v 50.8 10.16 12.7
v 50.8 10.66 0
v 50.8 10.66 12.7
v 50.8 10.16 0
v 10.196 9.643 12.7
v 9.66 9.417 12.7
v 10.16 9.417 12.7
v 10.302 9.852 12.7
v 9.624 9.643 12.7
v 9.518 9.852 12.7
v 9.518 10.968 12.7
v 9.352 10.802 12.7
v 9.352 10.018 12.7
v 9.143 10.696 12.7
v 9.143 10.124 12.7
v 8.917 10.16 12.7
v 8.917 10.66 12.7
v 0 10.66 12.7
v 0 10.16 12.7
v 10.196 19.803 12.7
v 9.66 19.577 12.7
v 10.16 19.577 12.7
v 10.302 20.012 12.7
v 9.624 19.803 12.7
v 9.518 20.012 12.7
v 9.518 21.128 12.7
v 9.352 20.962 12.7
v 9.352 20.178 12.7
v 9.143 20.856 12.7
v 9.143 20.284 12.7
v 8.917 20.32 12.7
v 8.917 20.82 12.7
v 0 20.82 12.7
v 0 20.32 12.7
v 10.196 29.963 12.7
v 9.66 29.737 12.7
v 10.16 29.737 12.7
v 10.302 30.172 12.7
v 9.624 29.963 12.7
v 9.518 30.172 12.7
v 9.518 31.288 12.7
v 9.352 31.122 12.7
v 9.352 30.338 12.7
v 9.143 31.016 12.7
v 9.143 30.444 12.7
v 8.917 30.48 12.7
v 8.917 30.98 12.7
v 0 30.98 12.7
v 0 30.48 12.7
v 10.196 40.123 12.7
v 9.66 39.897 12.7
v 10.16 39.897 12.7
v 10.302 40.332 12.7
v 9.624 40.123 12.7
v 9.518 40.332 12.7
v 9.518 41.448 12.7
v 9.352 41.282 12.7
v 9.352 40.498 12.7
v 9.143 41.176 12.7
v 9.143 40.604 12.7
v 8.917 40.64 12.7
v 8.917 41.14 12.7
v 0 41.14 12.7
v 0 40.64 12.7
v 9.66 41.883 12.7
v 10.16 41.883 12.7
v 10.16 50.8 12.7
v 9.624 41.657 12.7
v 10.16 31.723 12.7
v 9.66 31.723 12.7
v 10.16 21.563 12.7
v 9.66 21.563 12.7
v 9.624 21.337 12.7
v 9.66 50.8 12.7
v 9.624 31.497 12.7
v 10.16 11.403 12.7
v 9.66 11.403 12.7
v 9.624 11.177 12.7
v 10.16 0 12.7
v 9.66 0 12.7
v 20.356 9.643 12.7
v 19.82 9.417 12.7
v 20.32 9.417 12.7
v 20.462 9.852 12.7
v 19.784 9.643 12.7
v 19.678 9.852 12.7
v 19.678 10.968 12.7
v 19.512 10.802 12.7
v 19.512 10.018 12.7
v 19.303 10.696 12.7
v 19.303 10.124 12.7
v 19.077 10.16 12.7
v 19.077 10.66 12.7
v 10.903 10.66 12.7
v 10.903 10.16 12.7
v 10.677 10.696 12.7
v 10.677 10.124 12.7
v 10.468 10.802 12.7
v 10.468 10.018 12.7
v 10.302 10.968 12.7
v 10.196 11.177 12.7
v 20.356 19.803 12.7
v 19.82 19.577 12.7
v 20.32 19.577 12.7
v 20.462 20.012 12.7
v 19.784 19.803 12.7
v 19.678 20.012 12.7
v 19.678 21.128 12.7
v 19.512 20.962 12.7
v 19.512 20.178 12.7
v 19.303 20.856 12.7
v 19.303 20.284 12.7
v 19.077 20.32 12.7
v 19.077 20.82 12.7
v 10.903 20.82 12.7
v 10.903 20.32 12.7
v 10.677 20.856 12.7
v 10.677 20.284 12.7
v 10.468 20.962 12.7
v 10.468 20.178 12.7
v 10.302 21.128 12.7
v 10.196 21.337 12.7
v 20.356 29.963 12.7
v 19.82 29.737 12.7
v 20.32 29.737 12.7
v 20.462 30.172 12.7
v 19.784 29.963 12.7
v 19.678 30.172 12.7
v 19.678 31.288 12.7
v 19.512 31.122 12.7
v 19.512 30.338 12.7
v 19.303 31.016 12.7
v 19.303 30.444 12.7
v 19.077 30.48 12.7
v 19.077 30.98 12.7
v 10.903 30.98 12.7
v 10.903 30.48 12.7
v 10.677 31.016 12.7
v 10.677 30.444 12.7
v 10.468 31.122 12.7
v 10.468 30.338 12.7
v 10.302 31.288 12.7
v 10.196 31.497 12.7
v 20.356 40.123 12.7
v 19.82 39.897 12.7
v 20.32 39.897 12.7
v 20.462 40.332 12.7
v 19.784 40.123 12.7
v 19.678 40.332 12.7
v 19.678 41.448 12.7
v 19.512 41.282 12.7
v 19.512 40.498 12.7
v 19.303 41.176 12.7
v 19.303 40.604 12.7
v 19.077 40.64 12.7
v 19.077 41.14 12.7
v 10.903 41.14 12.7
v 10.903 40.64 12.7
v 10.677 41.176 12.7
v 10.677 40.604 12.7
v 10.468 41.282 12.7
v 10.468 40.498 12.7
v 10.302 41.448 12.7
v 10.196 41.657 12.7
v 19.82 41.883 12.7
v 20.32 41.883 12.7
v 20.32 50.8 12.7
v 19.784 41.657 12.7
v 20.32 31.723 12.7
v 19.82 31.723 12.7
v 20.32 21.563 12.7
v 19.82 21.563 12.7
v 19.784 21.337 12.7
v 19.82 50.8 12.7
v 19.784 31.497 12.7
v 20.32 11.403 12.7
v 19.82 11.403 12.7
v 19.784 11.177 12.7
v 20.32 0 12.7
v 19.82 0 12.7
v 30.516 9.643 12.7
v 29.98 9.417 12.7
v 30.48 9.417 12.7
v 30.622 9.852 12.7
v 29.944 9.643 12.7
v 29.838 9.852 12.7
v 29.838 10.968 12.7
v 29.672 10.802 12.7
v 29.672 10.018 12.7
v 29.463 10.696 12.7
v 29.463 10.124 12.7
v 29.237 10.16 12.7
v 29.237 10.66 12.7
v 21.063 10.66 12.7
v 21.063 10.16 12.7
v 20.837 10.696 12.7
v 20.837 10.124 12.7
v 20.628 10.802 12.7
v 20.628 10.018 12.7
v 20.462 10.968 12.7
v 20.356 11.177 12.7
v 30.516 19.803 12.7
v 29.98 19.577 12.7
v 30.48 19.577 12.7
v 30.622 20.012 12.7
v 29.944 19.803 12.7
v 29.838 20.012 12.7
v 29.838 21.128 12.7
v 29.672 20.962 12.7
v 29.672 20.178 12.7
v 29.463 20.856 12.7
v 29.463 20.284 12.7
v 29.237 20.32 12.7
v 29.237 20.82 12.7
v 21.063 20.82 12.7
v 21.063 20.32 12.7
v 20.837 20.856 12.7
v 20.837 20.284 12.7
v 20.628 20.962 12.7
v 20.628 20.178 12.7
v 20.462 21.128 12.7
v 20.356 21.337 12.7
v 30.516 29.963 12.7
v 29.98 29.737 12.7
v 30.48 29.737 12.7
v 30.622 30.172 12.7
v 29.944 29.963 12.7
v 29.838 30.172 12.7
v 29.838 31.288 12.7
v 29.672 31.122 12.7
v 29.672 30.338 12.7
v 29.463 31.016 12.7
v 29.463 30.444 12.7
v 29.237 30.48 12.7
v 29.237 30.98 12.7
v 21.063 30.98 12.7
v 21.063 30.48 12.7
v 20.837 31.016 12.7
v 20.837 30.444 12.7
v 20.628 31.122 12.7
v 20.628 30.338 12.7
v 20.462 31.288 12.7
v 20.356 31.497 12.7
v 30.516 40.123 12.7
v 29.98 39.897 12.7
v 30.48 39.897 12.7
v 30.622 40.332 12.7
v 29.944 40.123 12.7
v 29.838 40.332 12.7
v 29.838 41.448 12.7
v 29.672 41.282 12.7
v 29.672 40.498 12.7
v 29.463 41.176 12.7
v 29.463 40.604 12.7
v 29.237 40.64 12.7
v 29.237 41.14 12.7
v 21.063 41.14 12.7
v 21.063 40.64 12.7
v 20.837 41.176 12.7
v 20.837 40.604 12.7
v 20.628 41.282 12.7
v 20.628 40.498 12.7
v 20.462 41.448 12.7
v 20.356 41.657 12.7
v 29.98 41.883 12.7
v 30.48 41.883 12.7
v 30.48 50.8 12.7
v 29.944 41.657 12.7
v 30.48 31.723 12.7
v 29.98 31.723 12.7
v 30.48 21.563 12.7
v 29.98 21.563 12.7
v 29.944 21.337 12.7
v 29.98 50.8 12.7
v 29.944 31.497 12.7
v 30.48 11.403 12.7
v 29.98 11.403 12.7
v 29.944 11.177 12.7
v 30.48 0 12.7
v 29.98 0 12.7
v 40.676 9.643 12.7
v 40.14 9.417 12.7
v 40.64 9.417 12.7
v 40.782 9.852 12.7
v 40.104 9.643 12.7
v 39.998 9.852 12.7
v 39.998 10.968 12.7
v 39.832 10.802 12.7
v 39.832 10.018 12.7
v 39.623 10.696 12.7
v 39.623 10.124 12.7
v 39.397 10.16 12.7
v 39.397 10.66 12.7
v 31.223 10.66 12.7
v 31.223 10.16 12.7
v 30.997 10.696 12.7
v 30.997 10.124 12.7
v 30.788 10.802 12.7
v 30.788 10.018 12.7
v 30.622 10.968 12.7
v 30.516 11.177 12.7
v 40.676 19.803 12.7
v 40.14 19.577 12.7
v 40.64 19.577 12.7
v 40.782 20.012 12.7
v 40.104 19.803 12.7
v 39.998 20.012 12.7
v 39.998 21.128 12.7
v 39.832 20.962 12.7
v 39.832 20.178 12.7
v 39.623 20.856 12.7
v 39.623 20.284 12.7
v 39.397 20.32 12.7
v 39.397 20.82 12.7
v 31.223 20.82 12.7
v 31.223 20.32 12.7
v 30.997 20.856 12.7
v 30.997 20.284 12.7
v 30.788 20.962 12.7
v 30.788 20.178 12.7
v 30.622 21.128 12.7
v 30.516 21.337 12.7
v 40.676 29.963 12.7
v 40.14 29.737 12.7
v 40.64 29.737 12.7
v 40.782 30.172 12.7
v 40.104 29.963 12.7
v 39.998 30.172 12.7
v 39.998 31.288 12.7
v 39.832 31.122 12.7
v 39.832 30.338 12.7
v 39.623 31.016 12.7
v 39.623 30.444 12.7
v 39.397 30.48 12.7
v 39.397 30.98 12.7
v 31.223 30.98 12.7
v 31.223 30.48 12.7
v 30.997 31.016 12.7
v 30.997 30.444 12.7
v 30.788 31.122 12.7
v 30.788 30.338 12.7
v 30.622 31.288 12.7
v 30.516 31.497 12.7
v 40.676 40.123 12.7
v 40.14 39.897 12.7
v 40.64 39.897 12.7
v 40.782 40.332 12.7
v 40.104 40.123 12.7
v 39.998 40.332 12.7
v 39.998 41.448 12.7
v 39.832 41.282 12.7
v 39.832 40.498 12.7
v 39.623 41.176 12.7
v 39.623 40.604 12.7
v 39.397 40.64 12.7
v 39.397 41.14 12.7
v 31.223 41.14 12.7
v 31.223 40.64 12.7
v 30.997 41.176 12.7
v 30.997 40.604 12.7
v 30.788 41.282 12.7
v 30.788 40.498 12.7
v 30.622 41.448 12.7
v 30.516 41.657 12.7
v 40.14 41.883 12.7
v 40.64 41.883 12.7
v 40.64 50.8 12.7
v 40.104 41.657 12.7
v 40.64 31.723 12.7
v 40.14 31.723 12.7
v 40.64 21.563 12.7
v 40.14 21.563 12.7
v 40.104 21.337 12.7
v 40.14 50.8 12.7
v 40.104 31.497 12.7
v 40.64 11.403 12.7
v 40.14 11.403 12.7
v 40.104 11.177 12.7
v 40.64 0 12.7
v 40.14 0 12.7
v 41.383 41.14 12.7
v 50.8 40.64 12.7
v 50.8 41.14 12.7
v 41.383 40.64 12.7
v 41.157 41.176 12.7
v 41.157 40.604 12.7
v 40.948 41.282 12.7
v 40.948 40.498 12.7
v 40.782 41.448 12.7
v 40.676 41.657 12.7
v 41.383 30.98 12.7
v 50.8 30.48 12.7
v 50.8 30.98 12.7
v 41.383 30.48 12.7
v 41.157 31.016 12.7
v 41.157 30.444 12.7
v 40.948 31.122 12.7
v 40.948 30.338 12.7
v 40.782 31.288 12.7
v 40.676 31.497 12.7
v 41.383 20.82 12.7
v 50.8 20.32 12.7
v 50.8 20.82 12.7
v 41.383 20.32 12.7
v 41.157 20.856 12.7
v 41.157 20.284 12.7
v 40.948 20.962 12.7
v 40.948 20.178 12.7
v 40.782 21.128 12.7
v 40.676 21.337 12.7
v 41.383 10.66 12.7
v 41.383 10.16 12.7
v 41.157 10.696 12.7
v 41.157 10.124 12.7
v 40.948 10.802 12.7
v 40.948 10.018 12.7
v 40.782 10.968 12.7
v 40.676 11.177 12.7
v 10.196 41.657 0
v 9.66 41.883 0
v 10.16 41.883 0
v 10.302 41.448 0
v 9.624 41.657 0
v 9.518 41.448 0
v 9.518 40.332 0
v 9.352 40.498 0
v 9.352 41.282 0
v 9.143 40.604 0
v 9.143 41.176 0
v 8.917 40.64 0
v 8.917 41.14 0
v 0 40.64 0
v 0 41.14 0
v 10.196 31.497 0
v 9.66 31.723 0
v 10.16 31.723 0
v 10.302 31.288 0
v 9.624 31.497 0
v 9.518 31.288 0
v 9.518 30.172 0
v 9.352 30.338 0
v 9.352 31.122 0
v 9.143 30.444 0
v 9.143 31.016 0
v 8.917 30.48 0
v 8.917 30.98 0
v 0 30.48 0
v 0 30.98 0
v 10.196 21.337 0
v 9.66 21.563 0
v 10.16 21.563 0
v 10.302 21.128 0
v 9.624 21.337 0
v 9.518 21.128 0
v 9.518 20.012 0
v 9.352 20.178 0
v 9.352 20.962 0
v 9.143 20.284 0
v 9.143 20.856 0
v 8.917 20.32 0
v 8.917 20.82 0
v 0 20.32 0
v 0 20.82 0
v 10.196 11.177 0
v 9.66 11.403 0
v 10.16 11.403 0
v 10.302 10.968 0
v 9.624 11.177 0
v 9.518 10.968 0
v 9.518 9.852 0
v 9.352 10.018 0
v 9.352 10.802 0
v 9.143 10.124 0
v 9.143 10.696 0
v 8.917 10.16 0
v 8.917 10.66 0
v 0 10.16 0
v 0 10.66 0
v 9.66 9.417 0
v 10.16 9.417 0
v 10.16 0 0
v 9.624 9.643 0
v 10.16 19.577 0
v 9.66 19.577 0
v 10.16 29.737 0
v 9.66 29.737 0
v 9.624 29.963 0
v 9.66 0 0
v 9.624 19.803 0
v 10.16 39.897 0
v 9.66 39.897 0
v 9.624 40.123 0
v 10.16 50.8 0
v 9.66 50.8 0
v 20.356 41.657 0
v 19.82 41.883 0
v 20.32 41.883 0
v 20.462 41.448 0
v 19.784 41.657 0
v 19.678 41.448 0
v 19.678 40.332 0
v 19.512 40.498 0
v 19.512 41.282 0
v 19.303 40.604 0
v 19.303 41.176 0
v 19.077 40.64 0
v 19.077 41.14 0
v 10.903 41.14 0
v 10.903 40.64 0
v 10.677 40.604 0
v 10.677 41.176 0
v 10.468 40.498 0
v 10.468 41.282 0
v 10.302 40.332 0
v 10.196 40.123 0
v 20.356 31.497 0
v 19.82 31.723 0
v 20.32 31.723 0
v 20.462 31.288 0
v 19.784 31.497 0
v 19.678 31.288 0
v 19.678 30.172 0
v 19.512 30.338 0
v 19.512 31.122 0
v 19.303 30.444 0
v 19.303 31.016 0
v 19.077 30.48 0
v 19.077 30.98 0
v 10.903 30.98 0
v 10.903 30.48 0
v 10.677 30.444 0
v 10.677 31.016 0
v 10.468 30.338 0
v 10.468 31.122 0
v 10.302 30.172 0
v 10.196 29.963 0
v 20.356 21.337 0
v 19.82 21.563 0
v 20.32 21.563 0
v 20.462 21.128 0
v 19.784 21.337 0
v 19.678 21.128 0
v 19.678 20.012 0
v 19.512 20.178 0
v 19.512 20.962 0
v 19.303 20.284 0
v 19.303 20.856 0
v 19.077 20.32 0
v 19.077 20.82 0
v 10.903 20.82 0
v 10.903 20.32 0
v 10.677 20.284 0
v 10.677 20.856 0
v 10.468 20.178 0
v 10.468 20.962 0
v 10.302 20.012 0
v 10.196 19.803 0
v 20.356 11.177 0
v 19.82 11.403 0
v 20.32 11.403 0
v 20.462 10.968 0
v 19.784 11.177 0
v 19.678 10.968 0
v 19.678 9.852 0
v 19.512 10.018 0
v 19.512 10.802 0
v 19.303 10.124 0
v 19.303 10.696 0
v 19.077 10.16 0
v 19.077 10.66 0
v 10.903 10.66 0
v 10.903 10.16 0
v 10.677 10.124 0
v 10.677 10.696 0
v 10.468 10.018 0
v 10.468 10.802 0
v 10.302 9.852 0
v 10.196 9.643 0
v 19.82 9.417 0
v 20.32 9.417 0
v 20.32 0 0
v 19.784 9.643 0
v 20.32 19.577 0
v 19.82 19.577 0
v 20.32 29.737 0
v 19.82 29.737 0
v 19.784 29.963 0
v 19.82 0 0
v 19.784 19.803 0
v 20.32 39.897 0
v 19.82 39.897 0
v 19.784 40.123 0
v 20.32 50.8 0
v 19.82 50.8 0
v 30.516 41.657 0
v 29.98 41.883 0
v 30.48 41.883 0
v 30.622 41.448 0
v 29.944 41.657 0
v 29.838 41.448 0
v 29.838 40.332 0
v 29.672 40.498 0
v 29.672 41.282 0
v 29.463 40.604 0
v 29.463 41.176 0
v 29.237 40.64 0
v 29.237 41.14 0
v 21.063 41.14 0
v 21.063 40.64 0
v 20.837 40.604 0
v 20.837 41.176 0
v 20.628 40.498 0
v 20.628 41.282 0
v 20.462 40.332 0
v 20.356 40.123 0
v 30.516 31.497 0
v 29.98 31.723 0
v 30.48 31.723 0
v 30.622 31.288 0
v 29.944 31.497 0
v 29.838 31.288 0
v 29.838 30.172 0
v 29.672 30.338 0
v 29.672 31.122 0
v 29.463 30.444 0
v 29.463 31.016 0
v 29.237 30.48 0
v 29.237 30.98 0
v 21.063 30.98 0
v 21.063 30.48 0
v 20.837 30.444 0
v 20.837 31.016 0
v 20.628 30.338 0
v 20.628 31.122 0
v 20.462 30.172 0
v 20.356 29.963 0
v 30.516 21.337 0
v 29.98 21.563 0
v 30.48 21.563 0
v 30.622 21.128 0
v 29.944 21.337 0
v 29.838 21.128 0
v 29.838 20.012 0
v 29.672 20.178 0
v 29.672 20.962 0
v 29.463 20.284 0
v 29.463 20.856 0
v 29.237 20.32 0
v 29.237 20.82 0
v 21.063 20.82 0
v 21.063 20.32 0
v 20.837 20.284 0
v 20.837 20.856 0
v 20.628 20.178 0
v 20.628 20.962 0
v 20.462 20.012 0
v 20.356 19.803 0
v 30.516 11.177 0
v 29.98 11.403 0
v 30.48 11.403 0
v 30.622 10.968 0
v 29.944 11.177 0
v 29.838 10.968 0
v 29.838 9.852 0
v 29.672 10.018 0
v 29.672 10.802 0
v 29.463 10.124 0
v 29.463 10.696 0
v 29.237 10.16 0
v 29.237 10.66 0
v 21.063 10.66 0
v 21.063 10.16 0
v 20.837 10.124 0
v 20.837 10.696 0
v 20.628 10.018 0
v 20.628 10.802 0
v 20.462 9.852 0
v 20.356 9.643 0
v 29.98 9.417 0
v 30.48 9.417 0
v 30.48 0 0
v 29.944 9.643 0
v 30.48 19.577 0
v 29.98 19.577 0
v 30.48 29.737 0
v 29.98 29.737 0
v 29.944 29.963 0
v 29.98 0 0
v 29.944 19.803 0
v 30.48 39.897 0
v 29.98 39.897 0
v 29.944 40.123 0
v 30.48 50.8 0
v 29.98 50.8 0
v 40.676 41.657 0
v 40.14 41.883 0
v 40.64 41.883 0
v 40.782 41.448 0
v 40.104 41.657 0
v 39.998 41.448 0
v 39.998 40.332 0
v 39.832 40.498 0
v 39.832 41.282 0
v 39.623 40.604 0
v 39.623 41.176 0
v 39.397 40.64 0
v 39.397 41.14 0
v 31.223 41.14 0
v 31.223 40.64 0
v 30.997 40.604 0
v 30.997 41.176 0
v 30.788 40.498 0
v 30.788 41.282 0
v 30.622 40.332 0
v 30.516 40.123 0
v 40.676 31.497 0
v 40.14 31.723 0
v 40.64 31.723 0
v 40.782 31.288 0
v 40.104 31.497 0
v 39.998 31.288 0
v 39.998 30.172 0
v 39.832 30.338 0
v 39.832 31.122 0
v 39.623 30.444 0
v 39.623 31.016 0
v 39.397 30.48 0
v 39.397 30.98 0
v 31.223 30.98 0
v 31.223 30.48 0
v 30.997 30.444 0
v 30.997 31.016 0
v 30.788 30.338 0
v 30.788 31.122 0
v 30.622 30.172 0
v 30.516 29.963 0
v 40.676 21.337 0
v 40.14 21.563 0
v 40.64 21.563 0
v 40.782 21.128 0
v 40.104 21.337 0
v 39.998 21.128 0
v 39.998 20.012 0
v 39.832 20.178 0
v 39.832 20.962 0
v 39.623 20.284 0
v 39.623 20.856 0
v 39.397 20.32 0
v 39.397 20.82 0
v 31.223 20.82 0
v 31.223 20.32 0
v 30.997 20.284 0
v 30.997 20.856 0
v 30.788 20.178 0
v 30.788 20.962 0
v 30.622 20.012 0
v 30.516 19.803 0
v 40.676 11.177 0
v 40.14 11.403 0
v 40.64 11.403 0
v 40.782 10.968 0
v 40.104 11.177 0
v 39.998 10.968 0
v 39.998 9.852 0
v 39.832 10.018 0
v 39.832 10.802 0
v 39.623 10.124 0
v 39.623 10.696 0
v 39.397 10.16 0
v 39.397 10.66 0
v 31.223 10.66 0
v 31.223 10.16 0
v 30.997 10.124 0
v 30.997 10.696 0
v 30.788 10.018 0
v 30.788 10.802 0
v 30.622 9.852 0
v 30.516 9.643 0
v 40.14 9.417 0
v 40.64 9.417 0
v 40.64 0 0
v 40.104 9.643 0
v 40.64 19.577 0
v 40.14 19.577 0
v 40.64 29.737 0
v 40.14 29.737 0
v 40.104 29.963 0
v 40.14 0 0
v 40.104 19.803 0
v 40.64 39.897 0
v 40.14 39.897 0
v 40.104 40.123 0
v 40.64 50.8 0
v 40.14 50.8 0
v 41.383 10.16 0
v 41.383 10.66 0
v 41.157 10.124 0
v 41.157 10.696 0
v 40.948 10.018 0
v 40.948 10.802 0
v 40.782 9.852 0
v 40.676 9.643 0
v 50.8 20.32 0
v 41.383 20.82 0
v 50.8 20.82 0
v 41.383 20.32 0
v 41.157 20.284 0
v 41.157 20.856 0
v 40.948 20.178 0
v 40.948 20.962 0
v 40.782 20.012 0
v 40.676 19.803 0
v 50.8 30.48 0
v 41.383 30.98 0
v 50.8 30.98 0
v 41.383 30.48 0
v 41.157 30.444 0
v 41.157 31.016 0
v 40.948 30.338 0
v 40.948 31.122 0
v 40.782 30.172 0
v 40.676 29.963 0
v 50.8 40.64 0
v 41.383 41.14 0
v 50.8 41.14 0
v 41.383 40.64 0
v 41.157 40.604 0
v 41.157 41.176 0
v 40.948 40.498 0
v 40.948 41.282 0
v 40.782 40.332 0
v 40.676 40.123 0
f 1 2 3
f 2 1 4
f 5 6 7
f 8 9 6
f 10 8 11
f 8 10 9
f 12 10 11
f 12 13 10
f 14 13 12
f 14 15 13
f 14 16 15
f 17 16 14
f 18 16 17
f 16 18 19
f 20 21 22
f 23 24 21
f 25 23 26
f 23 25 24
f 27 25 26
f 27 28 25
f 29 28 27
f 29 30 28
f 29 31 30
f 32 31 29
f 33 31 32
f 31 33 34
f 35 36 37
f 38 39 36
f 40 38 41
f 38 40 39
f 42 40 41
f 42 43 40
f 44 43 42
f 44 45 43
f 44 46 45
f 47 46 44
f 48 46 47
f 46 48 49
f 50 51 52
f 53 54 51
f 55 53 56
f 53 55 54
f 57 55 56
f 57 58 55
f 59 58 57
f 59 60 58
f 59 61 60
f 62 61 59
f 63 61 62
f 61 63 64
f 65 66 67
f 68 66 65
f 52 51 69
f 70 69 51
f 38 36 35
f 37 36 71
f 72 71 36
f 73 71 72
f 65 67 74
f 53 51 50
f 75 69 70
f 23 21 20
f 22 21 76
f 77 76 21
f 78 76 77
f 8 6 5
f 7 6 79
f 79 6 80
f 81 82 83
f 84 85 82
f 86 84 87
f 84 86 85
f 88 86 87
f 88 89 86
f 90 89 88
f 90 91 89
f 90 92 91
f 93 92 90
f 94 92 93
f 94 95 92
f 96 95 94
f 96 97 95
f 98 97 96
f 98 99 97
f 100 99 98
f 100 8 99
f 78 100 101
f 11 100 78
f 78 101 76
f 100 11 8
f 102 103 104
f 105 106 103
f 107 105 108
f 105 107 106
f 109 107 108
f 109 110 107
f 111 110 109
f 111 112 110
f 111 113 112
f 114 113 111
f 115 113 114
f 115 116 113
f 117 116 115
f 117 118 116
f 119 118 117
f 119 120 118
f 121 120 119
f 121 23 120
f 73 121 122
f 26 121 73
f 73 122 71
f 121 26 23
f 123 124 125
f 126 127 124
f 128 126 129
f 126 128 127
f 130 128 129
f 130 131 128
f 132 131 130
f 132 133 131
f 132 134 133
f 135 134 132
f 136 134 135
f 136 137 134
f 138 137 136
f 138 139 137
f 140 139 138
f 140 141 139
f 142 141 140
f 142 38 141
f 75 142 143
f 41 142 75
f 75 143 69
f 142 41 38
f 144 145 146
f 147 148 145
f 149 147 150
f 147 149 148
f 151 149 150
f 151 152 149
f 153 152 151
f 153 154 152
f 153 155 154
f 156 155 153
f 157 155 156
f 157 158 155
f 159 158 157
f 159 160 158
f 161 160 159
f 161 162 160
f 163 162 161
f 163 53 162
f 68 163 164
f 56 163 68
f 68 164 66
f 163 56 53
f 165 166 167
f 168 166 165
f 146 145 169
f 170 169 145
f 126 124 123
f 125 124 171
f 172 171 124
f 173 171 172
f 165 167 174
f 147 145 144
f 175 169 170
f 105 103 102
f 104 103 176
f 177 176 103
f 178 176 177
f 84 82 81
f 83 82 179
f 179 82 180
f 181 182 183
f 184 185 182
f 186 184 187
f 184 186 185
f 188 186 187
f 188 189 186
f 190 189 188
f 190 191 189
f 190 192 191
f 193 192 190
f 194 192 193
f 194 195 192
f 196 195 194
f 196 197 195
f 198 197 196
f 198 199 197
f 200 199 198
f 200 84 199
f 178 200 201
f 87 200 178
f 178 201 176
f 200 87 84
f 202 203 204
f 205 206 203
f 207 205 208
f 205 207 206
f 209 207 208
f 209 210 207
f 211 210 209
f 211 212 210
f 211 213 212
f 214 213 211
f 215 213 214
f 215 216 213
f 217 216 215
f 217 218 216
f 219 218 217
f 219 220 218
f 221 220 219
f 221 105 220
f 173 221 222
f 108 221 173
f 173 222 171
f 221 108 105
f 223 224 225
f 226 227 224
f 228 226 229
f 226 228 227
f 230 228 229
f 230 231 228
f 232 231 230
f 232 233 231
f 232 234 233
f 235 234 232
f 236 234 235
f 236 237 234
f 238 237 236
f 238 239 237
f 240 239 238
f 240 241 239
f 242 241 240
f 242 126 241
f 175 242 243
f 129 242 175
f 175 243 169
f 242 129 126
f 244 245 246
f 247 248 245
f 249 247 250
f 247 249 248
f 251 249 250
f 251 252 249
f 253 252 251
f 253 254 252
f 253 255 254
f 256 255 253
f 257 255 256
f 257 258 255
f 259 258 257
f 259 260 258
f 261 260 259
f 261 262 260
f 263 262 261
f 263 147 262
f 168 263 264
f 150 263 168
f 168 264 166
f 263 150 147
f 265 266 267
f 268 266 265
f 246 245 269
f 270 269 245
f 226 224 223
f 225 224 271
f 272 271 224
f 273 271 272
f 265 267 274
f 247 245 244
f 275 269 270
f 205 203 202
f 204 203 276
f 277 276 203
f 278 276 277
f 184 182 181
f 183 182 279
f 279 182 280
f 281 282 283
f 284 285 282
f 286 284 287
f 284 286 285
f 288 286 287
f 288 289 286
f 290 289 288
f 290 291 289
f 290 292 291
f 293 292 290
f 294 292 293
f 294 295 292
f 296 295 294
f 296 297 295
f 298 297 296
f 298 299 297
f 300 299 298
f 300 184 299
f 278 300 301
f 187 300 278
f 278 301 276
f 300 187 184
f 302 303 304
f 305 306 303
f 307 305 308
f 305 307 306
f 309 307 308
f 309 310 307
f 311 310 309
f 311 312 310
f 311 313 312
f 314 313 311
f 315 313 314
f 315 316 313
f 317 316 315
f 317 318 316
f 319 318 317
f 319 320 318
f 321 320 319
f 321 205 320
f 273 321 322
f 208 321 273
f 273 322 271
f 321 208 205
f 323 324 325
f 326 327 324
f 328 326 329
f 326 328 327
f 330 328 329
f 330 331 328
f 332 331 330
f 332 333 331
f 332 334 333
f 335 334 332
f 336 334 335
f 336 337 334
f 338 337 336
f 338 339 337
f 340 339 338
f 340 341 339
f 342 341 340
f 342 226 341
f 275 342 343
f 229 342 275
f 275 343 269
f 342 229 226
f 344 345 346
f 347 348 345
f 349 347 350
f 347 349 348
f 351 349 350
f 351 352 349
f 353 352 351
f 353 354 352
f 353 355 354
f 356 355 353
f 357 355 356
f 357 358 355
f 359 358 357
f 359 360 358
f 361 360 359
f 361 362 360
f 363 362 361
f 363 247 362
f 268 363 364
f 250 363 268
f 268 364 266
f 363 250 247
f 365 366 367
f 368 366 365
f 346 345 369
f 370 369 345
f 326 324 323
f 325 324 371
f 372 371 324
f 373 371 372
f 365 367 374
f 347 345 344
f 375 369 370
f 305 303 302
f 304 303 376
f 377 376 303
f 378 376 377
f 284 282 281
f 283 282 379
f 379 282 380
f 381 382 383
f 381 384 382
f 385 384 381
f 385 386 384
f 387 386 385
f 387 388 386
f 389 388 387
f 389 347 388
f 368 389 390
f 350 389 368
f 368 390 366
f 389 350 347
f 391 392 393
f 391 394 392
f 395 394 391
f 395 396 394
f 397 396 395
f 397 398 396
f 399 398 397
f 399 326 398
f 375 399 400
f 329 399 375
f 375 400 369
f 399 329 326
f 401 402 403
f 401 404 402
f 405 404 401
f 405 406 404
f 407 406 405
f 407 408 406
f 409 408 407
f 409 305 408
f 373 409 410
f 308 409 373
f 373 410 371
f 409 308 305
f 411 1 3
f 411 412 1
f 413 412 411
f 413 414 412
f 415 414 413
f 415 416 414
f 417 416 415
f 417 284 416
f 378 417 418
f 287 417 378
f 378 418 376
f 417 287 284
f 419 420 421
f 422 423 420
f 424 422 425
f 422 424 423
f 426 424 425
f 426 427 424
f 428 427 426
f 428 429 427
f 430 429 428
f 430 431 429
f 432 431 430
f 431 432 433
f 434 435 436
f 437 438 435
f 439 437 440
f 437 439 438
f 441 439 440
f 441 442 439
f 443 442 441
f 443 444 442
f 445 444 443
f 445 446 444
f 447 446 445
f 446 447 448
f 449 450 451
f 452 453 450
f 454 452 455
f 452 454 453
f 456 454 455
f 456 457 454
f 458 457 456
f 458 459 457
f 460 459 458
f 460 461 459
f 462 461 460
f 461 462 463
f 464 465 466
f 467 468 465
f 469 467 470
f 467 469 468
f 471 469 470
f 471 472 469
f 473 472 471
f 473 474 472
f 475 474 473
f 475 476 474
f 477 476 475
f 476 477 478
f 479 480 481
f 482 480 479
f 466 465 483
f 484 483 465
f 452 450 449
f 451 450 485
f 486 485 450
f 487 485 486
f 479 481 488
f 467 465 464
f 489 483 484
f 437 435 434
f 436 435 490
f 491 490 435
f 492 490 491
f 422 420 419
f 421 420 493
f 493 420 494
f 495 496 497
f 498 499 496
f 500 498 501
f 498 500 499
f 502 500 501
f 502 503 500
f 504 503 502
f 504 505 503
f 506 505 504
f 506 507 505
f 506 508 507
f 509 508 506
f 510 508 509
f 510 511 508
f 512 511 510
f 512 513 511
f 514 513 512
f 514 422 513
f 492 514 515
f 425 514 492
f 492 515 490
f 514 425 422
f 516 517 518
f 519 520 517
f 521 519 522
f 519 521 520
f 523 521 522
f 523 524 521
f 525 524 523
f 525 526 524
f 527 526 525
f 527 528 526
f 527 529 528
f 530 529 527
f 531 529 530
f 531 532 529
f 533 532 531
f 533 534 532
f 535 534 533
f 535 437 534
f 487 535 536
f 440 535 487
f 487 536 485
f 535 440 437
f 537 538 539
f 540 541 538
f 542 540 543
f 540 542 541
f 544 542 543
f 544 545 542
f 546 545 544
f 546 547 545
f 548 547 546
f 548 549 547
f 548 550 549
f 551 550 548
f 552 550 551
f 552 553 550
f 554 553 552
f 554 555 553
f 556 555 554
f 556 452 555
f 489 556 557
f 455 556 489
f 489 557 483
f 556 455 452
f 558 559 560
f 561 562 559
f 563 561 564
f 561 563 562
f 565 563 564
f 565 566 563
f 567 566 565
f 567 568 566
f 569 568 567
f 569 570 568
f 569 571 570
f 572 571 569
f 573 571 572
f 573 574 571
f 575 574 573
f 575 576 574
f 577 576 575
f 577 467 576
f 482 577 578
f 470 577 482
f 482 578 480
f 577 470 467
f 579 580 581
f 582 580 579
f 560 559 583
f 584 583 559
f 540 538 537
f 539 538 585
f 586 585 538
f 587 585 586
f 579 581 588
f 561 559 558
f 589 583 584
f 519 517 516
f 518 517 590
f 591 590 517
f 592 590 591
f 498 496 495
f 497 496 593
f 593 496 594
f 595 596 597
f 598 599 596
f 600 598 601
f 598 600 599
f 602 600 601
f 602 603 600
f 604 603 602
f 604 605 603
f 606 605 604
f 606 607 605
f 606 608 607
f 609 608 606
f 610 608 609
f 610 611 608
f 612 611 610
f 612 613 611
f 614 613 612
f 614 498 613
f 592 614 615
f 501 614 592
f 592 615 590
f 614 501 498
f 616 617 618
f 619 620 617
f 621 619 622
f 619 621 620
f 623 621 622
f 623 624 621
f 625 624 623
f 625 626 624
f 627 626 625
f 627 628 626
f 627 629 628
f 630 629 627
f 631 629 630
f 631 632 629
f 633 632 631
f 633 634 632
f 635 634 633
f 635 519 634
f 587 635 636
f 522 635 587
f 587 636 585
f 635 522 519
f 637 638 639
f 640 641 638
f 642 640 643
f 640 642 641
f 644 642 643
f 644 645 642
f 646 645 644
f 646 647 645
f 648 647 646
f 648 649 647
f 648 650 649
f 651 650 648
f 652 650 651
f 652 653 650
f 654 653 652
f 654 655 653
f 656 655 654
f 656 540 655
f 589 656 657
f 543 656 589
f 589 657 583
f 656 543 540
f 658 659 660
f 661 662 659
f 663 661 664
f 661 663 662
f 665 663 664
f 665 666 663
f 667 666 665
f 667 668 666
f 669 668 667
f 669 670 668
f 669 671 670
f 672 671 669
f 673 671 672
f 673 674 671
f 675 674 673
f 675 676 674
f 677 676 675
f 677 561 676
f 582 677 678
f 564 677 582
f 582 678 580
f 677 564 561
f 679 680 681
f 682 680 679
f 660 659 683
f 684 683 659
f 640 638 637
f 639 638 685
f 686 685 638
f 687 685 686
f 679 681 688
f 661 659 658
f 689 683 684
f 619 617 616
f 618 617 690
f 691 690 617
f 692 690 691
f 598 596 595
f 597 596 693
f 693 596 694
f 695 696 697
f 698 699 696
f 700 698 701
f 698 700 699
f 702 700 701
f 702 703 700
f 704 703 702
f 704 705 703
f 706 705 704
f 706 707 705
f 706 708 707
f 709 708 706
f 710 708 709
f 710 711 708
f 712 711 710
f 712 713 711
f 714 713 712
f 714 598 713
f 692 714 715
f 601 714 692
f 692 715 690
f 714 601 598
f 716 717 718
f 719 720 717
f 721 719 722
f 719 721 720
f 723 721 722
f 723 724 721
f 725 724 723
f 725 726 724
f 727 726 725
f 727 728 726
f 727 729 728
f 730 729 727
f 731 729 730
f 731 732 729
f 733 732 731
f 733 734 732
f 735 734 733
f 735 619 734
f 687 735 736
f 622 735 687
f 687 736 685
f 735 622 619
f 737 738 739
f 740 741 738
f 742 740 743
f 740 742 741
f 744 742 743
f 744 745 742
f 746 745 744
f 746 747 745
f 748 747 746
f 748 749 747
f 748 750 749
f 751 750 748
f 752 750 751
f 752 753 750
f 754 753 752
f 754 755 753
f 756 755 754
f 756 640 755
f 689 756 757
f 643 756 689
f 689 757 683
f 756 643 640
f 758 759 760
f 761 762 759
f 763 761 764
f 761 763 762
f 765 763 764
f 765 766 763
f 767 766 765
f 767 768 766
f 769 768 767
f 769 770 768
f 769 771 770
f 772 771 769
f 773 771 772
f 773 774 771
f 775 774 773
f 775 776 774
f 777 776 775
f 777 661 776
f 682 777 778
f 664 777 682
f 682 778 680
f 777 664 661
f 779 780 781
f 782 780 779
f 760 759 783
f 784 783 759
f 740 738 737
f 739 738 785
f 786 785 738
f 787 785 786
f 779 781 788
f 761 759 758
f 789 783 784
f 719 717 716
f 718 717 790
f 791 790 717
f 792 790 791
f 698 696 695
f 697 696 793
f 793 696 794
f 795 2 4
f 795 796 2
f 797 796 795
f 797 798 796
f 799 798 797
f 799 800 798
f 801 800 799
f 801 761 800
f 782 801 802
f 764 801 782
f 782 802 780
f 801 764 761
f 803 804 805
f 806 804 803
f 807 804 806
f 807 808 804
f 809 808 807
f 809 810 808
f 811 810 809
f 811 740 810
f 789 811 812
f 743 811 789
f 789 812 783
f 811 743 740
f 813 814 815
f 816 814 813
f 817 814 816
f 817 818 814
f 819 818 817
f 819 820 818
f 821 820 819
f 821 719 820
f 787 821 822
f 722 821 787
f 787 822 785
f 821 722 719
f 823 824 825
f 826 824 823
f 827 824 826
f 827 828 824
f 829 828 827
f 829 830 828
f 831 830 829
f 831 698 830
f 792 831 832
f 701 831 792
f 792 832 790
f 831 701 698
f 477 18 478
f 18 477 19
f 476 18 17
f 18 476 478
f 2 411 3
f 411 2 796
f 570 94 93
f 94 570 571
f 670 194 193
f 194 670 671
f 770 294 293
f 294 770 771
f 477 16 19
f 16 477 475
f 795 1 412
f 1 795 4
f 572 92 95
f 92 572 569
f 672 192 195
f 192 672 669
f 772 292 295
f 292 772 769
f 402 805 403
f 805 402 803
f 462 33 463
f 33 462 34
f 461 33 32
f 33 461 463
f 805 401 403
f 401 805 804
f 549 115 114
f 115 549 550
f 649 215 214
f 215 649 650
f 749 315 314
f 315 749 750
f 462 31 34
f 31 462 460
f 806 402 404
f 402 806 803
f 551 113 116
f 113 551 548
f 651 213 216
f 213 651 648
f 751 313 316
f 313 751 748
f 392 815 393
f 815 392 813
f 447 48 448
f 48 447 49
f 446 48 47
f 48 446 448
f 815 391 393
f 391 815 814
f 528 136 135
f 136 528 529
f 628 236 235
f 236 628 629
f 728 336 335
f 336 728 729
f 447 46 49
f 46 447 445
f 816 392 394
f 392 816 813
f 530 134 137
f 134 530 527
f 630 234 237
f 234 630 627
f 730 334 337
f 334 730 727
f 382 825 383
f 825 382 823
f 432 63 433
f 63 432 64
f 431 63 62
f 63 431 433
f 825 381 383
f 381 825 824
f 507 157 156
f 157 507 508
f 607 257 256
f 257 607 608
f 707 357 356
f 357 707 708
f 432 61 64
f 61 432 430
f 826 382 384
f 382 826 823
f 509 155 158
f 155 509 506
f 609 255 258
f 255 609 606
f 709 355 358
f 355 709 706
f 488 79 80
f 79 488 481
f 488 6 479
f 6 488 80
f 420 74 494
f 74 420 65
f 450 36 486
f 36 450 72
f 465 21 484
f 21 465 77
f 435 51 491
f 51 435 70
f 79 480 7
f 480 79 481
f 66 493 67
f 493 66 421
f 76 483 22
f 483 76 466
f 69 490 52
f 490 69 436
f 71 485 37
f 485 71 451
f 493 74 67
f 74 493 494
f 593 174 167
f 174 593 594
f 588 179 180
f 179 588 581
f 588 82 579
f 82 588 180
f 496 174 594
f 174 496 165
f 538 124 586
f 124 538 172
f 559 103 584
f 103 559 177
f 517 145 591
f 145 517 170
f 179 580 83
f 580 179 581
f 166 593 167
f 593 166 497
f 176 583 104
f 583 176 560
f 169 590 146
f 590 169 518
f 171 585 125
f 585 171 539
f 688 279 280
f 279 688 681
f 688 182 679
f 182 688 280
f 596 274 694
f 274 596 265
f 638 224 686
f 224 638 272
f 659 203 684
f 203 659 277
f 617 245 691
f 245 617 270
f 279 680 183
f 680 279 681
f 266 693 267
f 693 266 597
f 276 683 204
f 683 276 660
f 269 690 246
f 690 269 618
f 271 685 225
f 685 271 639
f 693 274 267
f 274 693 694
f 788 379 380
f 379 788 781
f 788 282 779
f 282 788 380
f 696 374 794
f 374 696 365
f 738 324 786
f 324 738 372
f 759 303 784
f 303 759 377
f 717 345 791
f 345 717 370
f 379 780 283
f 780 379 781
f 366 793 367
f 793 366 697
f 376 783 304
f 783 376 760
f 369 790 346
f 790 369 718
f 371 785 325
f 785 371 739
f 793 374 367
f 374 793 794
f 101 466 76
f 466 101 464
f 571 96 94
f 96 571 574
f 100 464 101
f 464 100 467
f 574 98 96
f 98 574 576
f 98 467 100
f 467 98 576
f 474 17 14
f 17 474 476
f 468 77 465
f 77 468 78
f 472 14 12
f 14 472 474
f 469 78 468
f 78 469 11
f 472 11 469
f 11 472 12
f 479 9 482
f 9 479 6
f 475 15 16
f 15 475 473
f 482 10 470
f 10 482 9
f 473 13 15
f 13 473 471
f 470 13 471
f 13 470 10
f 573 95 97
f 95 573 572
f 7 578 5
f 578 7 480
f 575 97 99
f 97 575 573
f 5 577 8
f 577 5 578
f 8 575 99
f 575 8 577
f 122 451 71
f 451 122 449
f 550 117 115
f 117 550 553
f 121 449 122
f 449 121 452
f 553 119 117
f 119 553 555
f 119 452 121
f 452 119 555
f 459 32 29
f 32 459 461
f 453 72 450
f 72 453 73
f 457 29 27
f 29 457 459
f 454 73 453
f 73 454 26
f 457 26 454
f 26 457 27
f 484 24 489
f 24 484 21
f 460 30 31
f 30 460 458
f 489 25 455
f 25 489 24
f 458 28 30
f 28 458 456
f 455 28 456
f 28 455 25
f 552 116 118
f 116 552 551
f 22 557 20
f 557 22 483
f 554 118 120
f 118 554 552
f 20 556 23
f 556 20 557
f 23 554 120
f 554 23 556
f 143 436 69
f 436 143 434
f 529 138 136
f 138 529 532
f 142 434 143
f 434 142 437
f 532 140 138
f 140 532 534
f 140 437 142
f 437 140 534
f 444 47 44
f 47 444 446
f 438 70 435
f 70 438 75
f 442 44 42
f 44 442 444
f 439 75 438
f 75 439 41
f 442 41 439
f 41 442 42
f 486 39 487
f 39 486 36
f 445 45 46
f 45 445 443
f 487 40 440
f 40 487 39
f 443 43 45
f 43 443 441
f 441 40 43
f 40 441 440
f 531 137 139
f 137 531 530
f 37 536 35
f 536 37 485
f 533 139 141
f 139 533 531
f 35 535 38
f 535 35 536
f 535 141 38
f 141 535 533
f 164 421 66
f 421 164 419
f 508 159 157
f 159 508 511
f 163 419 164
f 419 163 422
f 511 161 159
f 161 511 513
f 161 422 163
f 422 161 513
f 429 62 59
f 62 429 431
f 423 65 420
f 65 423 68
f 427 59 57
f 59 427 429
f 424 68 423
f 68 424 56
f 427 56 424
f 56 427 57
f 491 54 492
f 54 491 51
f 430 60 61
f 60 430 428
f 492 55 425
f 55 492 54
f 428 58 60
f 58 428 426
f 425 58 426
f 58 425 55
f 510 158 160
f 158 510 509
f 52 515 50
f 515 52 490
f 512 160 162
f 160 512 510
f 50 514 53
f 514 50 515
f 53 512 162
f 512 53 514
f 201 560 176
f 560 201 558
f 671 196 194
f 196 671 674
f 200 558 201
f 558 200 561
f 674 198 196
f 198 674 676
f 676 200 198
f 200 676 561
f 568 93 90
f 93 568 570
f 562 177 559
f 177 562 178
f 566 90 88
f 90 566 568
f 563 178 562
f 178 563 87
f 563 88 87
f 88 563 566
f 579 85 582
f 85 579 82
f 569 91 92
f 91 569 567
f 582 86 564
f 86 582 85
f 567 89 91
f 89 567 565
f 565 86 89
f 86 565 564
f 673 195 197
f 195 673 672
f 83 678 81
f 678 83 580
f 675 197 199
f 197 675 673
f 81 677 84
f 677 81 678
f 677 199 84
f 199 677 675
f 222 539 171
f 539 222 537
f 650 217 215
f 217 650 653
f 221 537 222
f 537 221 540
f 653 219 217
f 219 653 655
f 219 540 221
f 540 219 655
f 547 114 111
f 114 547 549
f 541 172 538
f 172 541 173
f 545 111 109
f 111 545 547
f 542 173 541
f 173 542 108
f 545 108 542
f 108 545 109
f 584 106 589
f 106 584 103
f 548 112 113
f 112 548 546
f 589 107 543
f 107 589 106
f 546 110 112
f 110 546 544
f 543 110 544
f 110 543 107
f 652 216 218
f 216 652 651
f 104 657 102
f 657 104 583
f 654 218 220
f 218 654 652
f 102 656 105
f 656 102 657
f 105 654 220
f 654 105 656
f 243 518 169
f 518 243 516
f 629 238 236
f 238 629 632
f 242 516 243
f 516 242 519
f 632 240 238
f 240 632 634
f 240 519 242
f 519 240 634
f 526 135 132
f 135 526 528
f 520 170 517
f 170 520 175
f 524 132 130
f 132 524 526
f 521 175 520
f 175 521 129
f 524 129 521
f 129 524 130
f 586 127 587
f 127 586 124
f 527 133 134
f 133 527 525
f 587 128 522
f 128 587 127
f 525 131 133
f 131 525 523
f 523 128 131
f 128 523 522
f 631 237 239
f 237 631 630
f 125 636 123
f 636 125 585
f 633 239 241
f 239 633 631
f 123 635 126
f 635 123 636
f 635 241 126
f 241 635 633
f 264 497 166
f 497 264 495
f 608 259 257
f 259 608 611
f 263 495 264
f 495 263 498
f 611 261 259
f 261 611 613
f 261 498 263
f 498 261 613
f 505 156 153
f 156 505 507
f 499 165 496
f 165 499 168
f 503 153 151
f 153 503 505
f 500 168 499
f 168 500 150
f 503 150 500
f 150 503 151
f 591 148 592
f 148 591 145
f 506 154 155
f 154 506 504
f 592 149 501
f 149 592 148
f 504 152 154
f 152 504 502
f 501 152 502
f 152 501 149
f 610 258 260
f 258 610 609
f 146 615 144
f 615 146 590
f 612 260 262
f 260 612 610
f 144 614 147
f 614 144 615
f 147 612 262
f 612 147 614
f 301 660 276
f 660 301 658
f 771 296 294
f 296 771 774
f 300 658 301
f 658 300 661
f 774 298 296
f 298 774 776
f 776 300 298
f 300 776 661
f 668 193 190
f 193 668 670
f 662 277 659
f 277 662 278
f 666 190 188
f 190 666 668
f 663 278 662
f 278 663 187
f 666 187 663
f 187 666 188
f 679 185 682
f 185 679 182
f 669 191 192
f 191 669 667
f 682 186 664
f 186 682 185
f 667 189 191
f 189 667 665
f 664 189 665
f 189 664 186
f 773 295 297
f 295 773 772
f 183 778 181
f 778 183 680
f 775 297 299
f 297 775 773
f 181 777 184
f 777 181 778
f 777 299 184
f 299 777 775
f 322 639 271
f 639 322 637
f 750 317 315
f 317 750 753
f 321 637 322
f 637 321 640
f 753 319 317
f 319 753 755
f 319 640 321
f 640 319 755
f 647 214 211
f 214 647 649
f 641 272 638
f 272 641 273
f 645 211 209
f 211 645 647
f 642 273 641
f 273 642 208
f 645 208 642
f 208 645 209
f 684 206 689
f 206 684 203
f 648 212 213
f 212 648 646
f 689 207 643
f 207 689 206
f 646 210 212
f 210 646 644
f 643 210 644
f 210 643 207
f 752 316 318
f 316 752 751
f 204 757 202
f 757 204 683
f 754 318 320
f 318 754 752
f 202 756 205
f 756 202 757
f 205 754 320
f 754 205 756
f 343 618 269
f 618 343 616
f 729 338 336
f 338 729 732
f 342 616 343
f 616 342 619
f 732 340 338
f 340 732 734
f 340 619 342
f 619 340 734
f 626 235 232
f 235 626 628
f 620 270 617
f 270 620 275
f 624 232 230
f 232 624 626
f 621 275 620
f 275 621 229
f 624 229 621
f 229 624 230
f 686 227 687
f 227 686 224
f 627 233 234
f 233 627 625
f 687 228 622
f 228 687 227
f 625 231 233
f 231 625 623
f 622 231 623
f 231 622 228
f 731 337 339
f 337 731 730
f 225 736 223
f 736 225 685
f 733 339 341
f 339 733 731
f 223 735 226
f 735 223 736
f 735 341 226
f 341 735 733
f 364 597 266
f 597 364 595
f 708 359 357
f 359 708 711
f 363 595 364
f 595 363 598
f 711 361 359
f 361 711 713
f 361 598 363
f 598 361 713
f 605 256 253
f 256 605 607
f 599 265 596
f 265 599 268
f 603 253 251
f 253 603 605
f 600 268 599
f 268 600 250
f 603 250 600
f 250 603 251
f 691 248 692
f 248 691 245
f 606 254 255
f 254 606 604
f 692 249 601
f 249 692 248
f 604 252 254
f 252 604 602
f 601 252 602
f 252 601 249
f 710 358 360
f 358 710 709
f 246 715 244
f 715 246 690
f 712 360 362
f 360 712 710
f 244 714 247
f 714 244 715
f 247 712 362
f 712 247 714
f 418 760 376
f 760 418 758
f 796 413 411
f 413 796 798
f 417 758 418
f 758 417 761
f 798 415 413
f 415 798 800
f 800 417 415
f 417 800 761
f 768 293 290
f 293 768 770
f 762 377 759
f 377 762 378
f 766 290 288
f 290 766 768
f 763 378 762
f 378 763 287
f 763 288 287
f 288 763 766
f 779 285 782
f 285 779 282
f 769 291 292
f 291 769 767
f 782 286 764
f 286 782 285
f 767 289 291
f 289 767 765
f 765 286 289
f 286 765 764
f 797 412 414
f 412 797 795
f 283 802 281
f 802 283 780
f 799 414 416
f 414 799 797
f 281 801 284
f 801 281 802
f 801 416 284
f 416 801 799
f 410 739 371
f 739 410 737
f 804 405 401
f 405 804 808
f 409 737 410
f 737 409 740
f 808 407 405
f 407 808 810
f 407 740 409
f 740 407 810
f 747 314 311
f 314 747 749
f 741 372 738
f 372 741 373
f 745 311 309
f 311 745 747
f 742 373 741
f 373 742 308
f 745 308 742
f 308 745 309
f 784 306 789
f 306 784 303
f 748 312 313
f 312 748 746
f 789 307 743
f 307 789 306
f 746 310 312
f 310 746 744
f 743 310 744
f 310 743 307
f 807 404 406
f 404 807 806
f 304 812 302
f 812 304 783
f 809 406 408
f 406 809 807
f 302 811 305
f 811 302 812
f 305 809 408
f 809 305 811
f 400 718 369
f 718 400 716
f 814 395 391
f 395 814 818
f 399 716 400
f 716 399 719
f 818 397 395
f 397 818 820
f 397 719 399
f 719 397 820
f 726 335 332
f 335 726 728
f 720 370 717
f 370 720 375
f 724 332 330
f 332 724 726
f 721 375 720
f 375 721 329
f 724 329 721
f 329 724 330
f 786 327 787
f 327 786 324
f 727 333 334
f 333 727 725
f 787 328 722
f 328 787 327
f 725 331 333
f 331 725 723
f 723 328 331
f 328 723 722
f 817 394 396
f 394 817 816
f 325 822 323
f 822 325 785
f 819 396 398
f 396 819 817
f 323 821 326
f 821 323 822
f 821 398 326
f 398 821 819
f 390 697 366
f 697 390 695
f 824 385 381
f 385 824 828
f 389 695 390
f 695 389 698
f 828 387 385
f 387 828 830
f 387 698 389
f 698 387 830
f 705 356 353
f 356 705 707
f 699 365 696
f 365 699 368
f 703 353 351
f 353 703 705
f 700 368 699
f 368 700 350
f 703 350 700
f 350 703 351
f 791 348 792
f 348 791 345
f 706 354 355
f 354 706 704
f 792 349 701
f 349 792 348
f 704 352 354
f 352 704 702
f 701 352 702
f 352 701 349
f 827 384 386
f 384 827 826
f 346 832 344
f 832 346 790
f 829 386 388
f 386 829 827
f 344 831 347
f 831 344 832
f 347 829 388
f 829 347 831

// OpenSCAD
// [FL_INDEX: keywords="openscad, 3d_parametric, Drawer_Dividers, csg_solid" | COT="Parametric OpenSCAD design from 3DCodeverse"]
// Title: Drawer Dividers


height=12.7;				//divider height
width=50.8;			//container width
depth=50.8;			//container depth
row_dividers=4;		//# row dividers
column_dividers=4;	//# column dividers
fillet_diam=1.5;	   //fillet diameter 
wall_thickness=0.5;		//wall thickness

ff=0.001*1;				//fudge factor to create a closed manifold



union()
{

//// Dividers

	for(j = [0:row_dividers - 1])
	{
		translate([0,(depth/(row_dividers+1))+j*(depth/(row_dividers+1)),0]) cube([width,wall_thickness,height]);
	}

	for(k = [0:column_dividers - 1])
	{
		rotate([0,0,90]) translate([0,-(width/(column_dividers+1))-k*(width/(column_dividers+1)),0]) cube([depth,wall_thickness,height]);
	}

//// Fillets

	for(m = [0:column_dividers - 1])
	{
		for(n = [0:row_dividers - 1])
		{
			//// Upper right fillet
			translate([(width/(column_dividers+1))+m*(width/(column_dividers+1))-ff,(depth/(row_dividers+1))+n*(depth/(row_dividers+1))+wall_thickness-ff,0]) fillet();

			//// Upper left fillet
			translate([(width/(column_dividers+1))+m*(width/(column_dividers+1))-wall_thickness+ff,(depth/(row_dividers+1))+n*(depth/(row_dividers+1))+wall_thickness-ff,0]) rotate([0,0,90]) fillet();

			//// Lower left fillet
			translate([(width/(column_dividers+1))+m*(width/(column_dividers+1))-wall_thickness+ff,(depth/(row_dividers+1))+n*(depth/(row_dividers+1))+ff,0]) rotate([0,0,180]) fillet();

			//// Lower right fillet
			translate([(width/(column_dividers+1))+m*(width/(column_dividers+1))-ff,(depth/(row_dividers+1))+n*(depth/(row_dividers+1))+ff,0]) rotate([0,0,270]) fillet();

		}
	}

};



//////////// module definitions ///////////////////////

module fillet() 
{
	difference()
	{
		cube([fillet_diam/2,fillet_diam/2,height]);
		translate([fillet_diam/2,fillet_diam/2,0]) cylinder(h=(height+1)*2,r=fillet_diam/2,center=true,$fn=20);
	}
};
